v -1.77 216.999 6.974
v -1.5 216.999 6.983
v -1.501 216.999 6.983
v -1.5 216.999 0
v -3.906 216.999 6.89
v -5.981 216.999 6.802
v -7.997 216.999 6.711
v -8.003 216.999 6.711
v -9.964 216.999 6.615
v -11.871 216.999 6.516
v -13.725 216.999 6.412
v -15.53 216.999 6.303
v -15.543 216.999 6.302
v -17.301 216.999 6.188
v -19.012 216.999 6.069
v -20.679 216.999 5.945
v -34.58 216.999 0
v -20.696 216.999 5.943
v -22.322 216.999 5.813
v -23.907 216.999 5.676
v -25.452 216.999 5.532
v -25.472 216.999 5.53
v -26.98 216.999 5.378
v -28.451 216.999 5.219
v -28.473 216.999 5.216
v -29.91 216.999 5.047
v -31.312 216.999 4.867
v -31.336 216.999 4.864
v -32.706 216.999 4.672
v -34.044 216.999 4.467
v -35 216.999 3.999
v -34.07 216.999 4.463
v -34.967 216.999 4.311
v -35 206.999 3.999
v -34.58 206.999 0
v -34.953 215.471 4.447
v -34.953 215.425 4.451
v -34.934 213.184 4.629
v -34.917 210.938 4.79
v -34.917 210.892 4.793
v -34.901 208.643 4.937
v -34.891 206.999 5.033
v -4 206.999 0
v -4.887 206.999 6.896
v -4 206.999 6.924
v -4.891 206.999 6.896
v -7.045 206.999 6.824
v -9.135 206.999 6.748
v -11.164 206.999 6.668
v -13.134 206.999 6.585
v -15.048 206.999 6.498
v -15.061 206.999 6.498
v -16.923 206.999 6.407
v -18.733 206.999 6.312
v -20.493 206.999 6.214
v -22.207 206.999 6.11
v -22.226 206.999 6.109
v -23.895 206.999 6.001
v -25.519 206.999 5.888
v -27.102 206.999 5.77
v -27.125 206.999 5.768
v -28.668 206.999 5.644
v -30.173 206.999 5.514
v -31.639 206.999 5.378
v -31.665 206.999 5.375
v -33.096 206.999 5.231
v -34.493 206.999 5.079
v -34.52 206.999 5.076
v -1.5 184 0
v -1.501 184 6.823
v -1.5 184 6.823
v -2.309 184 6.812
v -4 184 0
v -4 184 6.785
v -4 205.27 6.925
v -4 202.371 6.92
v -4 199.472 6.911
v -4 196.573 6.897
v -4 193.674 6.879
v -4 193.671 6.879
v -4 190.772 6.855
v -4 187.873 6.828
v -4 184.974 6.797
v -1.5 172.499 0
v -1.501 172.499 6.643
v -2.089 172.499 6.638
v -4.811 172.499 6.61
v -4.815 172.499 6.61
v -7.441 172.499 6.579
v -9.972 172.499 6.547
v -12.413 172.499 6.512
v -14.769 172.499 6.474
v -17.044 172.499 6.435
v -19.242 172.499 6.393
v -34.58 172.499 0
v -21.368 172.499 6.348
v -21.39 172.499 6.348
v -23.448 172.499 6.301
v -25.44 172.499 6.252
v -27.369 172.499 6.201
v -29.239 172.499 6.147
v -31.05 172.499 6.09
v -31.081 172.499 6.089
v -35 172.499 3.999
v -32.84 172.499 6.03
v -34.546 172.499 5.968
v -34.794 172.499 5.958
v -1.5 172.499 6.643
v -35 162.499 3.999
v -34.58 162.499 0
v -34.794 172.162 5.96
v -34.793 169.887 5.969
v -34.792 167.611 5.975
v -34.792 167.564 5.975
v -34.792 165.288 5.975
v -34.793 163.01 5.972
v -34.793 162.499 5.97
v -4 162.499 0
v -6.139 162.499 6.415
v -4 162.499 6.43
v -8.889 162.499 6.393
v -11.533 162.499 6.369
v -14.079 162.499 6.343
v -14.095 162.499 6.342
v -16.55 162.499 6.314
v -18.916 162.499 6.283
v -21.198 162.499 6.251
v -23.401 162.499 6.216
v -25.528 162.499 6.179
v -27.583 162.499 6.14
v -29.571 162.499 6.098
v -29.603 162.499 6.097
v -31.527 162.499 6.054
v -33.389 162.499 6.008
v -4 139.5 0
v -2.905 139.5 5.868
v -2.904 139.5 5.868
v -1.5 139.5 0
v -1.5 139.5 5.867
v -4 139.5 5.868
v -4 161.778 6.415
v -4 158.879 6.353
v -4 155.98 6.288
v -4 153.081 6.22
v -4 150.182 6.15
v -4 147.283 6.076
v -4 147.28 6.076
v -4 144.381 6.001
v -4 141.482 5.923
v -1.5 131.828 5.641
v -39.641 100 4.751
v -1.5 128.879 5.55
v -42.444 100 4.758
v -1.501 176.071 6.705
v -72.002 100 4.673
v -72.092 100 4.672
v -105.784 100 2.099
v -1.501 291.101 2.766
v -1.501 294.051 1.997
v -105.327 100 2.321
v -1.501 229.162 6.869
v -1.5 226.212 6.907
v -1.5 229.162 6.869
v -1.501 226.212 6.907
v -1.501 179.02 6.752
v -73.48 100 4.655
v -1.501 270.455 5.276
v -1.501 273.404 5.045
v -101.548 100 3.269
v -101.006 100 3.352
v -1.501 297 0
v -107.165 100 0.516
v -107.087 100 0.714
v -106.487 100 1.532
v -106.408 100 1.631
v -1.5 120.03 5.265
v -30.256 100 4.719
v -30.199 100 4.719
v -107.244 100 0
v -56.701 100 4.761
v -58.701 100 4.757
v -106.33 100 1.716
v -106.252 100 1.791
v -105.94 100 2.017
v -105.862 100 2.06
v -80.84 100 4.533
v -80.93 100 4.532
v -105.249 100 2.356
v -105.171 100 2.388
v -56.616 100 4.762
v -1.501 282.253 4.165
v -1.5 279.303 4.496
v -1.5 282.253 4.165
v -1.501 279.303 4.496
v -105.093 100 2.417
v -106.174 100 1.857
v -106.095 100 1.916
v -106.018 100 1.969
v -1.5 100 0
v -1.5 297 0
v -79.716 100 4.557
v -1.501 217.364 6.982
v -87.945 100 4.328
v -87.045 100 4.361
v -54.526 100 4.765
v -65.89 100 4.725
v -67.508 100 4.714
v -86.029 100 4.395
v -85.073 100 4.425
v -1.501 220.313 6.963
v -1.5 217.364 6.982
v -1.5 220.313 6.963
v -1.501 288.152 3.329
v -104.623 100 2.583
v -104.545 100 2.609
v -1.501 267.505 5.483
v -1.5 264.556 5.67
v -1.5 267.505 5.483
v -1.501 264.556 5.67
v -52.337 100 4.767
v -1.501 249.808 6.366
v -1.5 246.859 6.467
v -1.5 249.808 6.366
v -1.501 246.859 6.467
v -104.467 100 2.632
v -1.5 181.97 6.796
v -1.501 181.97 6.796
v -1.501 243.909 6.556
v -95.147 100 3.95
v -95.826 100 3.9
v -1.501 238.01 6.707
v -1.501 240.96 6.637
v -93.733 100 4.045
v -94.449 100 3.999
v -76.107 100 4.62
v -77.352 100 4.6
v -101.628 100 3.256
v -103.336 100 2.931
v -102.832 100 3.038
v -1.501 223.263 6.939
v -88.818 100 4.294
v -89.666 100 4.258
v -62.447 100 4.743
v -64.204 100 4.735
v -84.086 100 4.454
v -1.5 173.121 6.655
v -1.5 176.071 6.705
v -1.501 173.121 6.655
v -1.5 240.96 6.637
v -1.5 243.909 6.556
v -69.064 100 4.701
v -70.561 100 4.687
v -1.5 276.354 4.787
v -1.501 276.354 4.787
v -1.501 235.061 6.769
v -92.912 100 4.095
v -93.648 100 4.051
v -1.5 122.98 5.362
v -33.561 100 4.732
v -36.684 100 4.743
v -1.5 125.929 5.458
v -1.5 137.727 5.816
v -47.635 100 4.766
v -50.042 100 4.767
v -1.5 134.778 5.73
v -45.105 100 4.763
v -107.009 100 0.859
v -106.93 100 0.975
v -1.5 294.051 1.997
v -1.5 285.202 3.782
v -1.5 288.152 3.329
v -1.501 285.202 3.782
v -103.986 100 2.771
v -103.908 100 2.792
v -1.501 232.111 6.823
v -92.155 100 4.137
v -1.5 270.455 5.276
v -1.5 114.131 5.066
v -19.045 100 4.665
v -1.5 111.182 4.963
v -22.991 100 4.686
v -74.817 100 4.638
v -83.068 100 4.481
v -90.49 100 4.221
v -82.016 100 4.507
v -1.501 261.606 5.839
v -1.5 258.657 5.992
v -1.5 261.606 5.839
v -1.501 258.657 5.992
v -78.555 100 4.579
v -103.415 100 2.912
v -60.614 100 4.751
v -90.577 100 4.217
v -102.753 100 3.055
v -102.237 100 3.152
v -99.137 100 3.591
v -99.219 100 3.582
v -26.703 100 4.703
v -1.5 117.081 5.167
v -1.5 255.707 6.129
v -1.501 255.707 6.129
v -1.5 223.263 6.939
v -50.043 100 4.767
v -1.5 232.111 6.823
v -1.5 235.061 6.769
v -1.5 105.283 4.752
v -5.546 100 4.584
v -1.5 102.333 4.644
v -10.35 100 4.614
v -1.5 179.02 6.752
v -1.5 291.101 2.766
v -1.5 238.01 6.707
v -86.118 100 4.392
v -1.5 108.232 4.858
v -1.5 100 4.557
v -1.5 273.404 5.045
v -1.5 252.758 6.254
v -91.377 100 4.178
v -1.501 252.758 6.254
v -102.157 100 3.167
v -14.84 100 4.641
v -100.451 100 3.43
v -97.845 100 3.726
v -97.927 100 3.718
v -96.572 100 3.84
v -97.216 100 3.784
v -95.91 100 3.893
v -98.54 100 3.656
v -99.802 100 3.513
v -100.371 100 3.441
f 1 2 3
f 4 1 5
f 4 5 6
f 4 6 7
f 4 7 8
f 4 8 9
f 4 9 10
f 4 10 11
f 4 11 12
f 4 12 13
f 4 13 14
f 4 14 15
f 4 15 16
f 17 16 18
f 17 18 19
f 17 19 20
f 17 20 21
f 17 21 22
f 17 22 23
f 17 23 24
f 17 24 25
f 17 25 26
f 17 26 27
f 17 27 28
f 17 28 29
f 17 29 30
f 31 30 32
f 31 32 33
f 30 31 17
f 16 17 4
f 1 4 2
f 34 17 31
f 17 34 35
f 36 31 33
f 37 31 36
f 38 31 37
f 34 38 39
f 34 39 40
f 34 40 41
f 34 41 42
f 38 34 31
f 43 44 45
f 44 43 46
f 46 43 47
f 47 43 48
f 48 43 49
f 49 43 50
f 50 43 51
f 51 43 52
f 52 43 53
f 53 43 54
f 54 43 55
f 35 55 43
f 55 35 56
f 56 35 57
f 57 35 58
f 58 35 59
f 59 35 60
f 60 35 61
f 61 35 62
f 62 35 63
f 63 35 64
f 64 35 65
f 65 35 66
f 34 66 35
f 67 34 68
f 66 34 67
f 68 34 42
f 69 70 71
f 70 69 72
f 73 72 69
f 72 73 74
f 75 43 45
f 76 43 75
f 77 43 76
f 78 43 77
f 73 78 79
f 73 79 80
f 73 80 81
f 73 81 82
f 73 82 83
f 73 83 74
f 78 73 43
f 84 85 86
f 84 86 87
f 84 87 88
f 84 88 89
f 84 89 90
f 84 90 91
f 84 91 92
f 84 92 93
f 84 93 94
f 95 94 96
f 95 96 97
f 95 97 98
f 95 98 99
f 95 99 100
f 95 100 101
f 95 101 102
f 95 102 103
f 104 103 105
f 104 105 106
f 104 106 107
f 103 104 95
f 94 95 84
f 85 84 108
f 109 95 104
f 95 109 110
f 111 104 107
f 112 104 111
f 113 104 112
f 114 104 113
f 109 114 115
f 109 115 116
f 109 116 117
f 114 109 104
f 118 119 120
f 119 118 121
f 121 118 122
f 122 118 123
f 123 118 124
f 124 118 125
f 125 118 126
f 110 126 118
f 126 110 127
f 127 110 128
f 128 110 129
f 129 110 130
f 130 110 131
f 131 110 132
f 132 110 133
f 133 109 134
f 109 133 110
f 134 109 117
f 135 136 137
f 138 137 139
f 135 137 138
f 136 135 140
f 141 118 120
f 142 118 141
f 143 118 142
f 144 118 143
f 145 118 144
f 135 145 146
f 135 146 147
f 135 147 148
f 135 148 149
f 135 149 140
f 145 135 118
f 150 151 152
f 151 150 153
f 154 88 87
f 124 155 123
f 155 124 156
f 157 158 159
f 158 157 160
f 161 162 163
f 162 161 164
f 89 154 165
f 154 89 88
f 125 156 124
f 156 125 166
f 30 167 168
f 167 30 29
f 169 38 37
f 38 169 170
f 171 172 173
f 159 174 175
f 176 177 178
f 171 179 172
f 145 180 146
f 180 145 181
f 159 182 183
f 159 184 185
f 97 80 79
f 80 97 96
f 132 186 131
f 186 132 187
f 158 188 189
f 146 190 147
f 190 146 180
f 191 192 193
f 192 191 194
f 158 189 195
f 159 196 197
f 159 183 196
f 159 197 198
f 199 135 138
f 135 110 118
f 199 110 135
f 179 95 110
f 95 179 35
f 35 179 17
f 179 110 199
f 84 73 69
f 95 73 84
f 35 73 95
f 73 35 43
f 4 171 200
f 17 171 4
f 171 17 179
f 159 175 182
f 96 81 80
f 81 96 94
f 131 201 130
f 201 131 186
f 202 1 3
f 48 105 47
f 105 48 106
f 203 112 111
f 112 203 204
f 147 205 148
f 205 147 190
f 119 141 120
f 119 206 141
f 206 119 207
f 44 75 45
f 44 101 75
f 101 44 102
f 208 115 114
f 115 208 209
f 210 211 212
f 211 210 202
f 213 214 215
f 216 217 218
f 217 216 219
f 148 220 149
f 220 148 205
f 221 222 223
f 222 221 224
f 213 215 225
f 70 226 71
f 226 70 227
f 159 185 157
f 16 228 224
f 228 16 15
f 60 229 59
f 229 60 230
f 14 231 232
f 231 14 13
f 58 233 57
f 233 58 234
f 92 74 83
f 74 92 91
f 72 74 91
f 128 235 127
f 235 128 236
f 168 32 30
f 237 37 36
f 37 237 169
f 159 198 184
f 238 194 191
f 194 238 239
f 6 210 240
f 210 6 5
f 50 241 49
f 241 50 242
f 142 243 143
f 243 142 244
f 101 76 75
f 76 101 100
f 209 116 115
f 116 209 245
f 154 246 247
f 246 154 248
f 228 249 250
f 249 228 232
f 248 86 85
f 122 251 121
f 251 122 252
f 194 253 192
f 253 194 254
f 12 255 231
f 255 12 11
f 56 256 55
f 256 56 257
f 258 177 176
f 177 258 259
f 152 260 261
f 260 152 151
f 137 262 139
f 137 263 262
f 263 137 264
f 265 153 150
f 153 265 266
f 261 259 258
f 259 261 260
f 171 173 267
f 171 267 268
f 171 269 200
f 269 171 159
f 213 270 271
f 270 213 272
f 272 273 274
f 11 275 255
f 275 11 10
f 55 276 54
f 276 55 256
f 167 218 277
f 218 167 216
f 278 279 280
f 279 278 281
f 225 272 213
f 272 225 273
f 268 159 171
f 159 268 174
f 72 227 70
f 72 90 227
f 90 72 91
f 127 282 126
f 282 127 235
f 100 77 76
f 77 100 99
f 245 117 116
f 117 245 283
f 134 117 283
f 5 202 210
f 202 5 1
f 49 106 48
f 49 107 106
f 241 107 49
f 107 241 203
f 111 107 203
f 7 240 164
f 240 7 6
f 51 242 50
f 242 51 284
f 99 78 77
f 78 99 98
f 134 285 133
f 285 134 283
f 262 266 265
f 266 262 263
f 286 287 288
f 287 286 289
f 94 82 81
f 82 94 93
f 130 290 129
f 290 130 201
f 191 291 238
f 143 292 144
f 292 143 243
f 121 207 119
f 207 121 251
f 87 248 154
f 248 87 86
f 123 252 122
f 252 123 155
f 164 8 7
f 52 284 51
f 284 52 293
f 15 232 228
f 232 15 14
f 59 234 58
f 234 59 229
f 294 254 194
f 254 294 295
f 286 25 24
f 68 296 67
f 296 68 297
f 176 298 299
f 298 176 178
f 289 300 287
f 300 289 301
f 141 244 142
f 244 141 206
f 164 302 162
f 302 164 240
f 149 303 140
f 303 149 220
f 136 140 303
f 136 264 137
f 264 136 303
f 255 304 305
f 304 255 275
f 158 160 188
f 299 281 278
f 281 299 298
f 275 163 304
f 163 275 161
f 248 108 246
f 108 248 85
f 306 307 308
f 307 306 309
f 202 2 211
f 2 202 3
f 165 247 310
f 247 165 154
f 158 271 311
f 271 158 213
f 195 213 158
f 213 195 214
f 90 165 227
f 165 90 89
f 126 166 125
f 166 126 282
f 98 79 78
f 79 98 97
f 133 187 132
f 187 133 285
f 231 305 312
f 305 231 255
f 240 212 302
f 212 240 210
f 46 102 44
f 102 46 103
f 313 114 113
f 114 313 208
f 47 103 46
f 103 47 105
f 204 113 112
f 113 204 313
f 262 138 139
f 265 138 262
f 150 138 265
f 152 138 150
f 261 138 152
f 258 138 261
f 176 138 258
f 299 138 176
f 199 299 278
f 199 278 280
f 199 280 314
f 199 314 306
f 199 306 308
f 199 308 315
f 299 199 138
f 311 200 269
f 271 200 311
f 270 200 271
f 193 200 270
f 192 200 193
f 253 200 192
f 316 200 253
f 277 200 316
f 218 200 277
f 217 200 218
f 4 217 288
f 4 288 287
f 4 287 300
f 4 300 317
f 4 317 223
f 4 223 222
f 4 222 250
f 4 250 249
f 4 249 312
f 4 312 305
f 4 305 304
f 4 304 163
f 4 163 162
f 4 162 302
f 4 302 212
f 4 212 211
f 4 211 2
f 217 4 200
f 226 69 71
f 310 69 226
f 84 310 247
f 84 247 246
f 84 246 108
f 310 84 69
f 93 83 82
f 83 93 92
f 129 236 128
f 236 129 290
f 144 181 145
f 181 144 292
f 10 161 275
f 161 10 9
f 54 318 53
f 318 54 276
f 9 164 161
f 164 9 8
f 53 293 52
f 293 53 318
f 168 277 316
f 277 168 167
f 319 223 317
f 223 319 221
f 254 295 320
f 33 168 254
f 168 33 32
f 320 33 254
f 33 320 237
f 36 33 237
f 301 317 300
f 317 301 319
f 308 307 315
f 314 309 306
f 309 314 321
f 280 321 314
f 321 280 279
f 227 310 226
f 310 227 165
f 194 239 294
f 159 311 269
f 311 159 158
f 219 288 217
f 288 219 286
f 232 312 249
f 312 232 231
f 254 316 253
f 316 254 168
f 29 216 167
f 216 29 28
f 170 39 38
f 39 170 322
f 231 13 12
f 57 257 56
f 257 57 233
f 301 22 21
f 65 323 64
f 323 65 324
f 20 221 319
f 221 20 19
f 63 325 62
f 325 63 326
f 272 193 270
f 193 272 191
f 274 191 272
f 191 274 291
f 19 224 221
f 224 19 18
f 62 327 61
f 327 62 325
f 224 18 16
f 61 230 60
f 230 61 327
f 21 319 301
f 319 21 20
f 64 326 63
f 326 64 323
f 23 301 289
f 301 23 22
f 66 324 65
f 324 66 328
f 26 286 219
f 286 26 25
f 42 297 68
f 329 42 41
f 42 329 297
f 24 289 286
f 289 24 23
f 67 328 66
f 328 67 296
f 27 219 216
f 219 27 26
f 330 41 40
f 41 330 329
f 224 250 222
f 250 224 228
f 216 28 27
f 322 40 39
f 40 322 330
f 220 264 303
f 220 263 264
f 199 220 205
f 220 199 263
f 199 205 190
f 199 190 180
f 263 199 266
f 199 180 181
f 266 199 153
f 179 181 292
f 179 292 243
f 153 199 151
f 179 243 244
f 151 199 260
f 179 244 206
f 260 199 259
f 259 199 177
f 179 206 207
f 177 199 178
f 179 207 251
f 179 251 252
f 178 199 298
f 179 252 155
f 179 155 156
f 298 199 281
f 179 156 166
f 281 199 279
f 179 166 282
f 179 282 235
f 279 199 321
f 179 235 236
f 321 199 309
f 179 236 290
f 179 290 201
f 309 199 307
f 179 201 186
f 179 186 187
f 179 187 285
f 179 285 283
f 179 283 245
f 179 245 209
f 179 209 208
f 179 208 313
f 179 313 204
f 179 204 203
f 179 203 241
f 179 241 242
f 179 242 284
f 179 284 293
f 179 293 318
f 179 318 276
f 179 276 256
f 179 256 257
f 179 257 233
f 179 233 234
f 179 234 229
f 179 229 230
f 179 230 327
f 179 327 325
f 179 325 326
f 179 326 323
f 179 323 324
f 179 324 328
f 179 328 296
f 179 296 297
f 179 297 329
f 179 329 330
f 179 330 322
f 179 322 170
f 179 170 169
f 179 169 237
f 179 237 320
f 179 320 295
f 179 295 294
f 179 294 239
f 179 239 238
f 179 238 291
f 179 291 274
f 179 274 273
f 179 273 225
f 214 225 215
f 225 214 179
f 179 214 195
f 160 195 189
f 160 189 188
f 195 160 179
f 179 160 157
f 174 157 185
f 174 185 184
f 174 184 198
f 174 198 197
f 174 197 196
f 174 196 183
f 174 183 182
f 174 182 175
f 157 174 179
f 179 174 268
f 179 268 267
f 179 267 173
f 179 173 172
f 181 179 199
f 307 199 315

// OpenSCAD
module motorCutOut( length, width, rad, spac ) {
	translate([0,0,length+spac/2.0 - e])
	cylinder(h=spac, r=rad, center=true);
	translate([0,0,length/2.0])
	cube(size=[width,width,length], center=true);
}

// x goes from 0 to 1, t determines thickness
function naca_half_thickness(x,t) = 5*t*(0.2969*sqrt(x) - 0.1260*x - 0.3516*pow(x,2) + 0.2843*pow(x,3) - 0.1015*pow(x,4));
function naca_pts(t,n,s=1) = concat([ for (x=[0:1/(n-1):1-(1/n)]) [s*x, s*naca_half_thickness(x,t)] ], [[s,0]]);
module wing(rootLength,root_h, tipLength,tip_h, span){

	root_t = 2*root_h / rootLength;
	tip_t = 2*tip_h / tipLength;

	nPtsRoot = 100;
	nPtsTip = 100;
	
	hull(){
		// Root cross section
		linear_extrude(height=e){
			polygon(naca_pts(root_t,nPtsRoot,rootLength));
		}

		// Tip cross section
		translate([rootLength-tipLength,0,span])
		linear_extrude(height=e){
			polygon(naca_pts(tip_t,nPtsTip,tipLength));
		}
	}
}



//module Mirage2000_body(s,l,thickness) {
//	
//	pts = [];
//	
//	linear_extrude(thickness){
//		polygon(pts);
//	}
//}



module Mirage2000_body(s,l,thickness) {
	
	th = 80;
	tw = 90;
	
	linear_extrude(thickness){
		// Nose
		translate([0.35*s,.99*l,0])
		intersection(){
			translate([0.35*s,0,0])
			scale([1,1.7,1])
			circle(r=.70*s);
			translate([-0.35*s,0,0])
			scale([1,1.7,1])
			circle(r=.70*s);
		}
		
		// fuselage
		square([s,0.98*l]);
		
		// canopy
		translate([0.75*s,0.95*l,0])
		rotate([0,0,18])
		intersection(){
			translate([0.35*s,0,0])
			scale([1,1.25,1])
			circle(r=0.70*s);
			translate([-0.35*s,0,0])
			scale([1.1,1.25,1])
			circle(r=0.70*s);
		}
		
		// Exhaust
		difference(){
			translate([s/2,0,0])
			scale([1,2,1])
			circle(r=s/2);
			
			translate([0,-(s+s/1.5),0])
			square([s,s]);
		}
		
		// Tail
		translate([s,0,0])
		difference(){
			square([th,tw]);
			translate([1.2*th,0,0])
			rotate([0,0,45])
			square([th,2*th]);
		}
	}
}


module controlSurface(l,th,d){
	pts = [[0,0],[th,th],[d/2,th],[d,th/2],[d/2,0]];
	
	linear_extrude(l){
		polygon(pts);
	}

	translate([th,th-e,l/10])
	cube(size=[10,10,2]);
}

module controlSurfaceCutout(l,th,d,h=50){
	pts = [[-th,th],[0,0],[0,-h/2],[d,-h/2],[d,h/2],[-th,h/2]];
	
	linear_extrude(l){
		polygon(pts);
	}
}

// Fudge factor
e = 0.001;

// Wing parameters
wingLength = 292.0;
wingRootHeight = 7;

wingTipLength = 20.0;
wingTipHeight = 2.5;

wingSpan = wingLength / 2.0;

// Motor cutout specifications
motor_rad = 4;
motor_length = 23.0;
prop_rad = 35.0;
prop_thick = 10.0;

motor1_pos = wingLength - prop_thick - motor_length - 2*(prop_rad + 5);
motor2_pos = motor1_pos - (prop_thick+1.5*motor_length);

// Aileron and aileron cut out specifications
aileronStart = 15;
aileronLength = 100;
aileronDepth = 30;
aileronThickness = 3;

// rudder and cut out specs
rudderStart = 7;
rudderLength = 40;
rudderDepth = 30;
rudderThickness = 3;

// control surface wiggle room
wiggleRoom = 2;

// Body specifications
fuselageLength = 344.0;
fuselageH = motor_rad + prop_rad + 10;
fuselageThickness = 3.0;

wingPos = 5.0;



// wing 1/2
intersection(){

translate([-200,100,-100])
cube([220,220,220]);

difference() {

	union(){
		translate([-fuselageThickness/2,wingLength + wingPos,0])
		rotate([90,0,-90])
		wing( wingLength, wingRootHeight, wingTipLength, wingTipHeight, wingSpan );

//		translate([fuselageThickness/2,0,0])
//		rotate([0,-90,0])
//		Mirage2000_body(fuselageH,fuselageLength,fuselageThickness);

	}

	translate([0,motor1_pos+wingPos,motor_rad-e])
	rotate([-90,0,0])
	motorCutOut( motor_length, 2*motor_rad, prop_rad, prop_thick );

	translate([0,motor2_pos+wingPos,motor_rad-e])
	rotate([-90,0,0])
	motorCutOut( motor_length, 2*motor_rad, prop_rad, prop_thick );
	
	// aileron cut out
	translate([-aileronStart+wiggleRoom,wingPos+aileronDepth,0])
	rotate([90,0,-90])
	controlSurfaceCutout( aileronLength+2*wiggleRoom, 2*aileronThickness, 1.25*aileronDepth );
	
	// rudder cut out
	translate([-fuselageThickness/2,rudderDepth,rudderStart+fuselageH -wiggleRoom])
	rotate([0,0,-90])
	controlSurfaceCutout( rudderLength+2*wiggleRoom, 2*rudderThickness, 1.25*rudderDepth );

}

}





//// wing 2/2
//intersection(){

//translate([-200,-120,-100])
//cube([220,220,220]);

//difference() {

//	union(){
//		translate([-fuselageThickness/2,wingLength + wingPos,0])
//		rotate([90,0,-90])
//		wing( wingLength, wingRootHeight, wingTipLength, wingTipHeight, wingSpan );

////		translate([fuselageThickness/2,0,0])
////		rotate([0,-90,0])
////		Mirage2000_body(fuselageH,fuselageLength,fuselageThickness);

//	}

//	translate([0,motor1_pos+wingPos,motor_rad-e])
//	rotate([-90,0,0])
//	motorCutOut( motor_length, 2*motor_rad, prop_rad, prop_thick );

//	translate([0,motor2_pos+wingPos,motor_rad-e])
//	rotate([-90,0,0])
//	motorCutOut( motor_length, 2*motor_rad, prop_rad, prop_thick );
//	
//	// aileron cut out
//	translate([-aileronStart+wiggleRoom,wingPos+aileronDepth,0])
//	rotate([90,0,-90])
//	controlSurfaceCutout( aileronLength+2*wiggleRoom, 2*aileronThickness, 1.25*aileronDepth );
//	
//	// rudder cut out
//	translate([-fuselageThickness/2,rudderDepth,rudderStart+fuselageH -wiggleRoom])
//	rotate([0,0,-90])
//	controlSurfaceCutout( rudderLength+2*wiggleRoom, 2*rudderThickness, 1.25*rudderDepth );

//}

//}







//// fuselage 1/3
//intersection(){

//translate([-200,450-180,-100])
//cube([220,220,220]);

//difference() {

//	union(){
////		translate([-fuselageThickness/2,wingLength + wingPos,0])
////		rotate([90,0,-90])
////		wing( wingLength, wingRootHeight, wingTipLength, wingTipHeight, wingSpan );

//		translate([fuselageThickness/2,0,0])
//		rotate([0,-90,0])
//		Mirage2000_body(fuselageH,fuselageLength,fuselageThickness);

//	}

//	translate([0,motor1_pos+wingPos,motor_rad-e])
//	rotate([-90,0,0])
//	motorCutOut( motor_length, 2*motor_rad, prop_rad, prop_thick );

//	translate([0,motor2_pos+wingPos,motor_rad-e])
//	rotate([-90,0,0])
//	motorCutOut( motor_length, 2*motor_rad, prop_rad, prop_thick );
//	
//	// aileron cut out
//	translate([-aileronStart+wiggleRoom,wingPos+aileronDepth,0])
//	rotate([90,0,-90])
//	controlSurfaceCutout( aileronLength+2*wiggleRoom, 2*aileronThickness, 1.25*aileronDepth );
//	
//	// rudder cut out
//	translate([-fuselageThickness/2,rudderDepth,rudderStart+fuselageH -wiggleRoom])
//	rotate([0,0,-90])
//	controlSurfaceCutout( rudderLength+2*wiggleRoom, 2*rudderThickness, 1.25*rudderDepth );

//}

//}




//// fuselage 2/3
//difference(){


//difference() {

//	union(){
////		translate([-fuselageThickness/2,wingLength + wingPos,0])
////		rotate([90,0,-90])
////		wing( wingLength, wingRootHeight, wingTipLength, wingTipHeight, wingSpan );

//		translate([fuselageThickness/2,0,0])
//		rotate([0,-90,0])
//		Mirage2000_body(fuselageH,fuselageLength,fuselageThickness);

//	}

//	translate([0,motor1_pos+wingPos,motor_rad-e])
//	rotate([-90,0,0])
//	motorCutOut( motor_length, 2*motor_rad, prop_rad, prop_thick );

//	translate([0,motor2_pos+wingPos,motor_rad-e])
//	rotate([-90,0,0])
//	motorCutOut( motor_length, 2*motor_rad, prop_rad, prop_thick );
//	
//	// aileron cut out
//	translate([-aileronStart+wiggleRoom,wingPos+aileronDepth,0])
//	rotate([90,0,-90])
//	controlSurfaceCutout( aileronLength+2*wiggleRoom, 2*aileronThickness, 1.25*aileronDepth );
//	
//	// rudder cut out
//	translate([-fuselageThickness/2,rudderDepth,rudderStart+fuselageH -wiggleRoom])
//	rotate([0,0,-90])
//	controlSurfaceCutout( rudderLength+2*wiggleRoom, 2*rudderThickness, 1.25*rudderDepth );

//}

//translate([-200,450-180,-100])
//cube([220,220,220]);
//translate([-200,491-180-2*220,-50])
//cube([220,220,220]);

//}






//// fuselage 3/3
//intersection(){

//translate([-200,491-180-2*220,-50])
//cube([220,220,220]);

//difference() {

//	union(){
////		translate([-fuselageThickness/2,wingLength + wingPos,0])
////		rotate([90,0,-90])
////		wing( wingLength, wingRootHeight, wingTipLength, wingTipHeight, wingSpan );

//		translate([fuselageThickness/2,0,0])
//		rotate([0,-90,0])
//		Mirage2000_body(fuselageH,fuselageLength,fuselageThickness);

//	}

//	translate([0,motor1_pos+wingPos,motor_rad-e])
//	rotate([-90,0,0])
//	motorCutOut( motor_length, 2*motor_rad, prop_rad, prop_thick );

//	translate([0,motor2_pos+wingPos,motor_rad-e])
//	rotate([-90,0,0])
//	motorCutOut( motor_length, 2*motor_rad, prop_rad, prop_thick );
//	
//	// aileron cut out
//	translate([-aileronStart+wiggleRoom,wingPos+aileronDepth,0])
//	rotate([90,0,-90])
//	controlSurfaceCutout( aileronLength+2*wiggleRoom, 2*aileronThickness, 1.25*aileronDepth );
//	
//	// rudder cut out
//	translate([-fuselageThickness/2,rudderDepth,rudderStart+fuselageH -wiggleRoom])
//	rotate([0,0,-90])
//	controlSurfaceCutout( rudderLength+2*wiggleRoom, 2*rudderThickness, 1.25*rudderDepth );

//}

//}



//// aileron
//translate([-aileronStart,wingPos+aileronDepth -3,0])
//rotate([90,0,-90])
//controlSurface( aileronLength, aileronThickness, aileronDepth );


//// Rudder
//translate([-fuselageThickness/2, rudderDepth -3, rudderStart+fuselageH])
//rotate([0,0,-90])
//controlSurface( rudderLength, rudderThickness, rudderDepth );
